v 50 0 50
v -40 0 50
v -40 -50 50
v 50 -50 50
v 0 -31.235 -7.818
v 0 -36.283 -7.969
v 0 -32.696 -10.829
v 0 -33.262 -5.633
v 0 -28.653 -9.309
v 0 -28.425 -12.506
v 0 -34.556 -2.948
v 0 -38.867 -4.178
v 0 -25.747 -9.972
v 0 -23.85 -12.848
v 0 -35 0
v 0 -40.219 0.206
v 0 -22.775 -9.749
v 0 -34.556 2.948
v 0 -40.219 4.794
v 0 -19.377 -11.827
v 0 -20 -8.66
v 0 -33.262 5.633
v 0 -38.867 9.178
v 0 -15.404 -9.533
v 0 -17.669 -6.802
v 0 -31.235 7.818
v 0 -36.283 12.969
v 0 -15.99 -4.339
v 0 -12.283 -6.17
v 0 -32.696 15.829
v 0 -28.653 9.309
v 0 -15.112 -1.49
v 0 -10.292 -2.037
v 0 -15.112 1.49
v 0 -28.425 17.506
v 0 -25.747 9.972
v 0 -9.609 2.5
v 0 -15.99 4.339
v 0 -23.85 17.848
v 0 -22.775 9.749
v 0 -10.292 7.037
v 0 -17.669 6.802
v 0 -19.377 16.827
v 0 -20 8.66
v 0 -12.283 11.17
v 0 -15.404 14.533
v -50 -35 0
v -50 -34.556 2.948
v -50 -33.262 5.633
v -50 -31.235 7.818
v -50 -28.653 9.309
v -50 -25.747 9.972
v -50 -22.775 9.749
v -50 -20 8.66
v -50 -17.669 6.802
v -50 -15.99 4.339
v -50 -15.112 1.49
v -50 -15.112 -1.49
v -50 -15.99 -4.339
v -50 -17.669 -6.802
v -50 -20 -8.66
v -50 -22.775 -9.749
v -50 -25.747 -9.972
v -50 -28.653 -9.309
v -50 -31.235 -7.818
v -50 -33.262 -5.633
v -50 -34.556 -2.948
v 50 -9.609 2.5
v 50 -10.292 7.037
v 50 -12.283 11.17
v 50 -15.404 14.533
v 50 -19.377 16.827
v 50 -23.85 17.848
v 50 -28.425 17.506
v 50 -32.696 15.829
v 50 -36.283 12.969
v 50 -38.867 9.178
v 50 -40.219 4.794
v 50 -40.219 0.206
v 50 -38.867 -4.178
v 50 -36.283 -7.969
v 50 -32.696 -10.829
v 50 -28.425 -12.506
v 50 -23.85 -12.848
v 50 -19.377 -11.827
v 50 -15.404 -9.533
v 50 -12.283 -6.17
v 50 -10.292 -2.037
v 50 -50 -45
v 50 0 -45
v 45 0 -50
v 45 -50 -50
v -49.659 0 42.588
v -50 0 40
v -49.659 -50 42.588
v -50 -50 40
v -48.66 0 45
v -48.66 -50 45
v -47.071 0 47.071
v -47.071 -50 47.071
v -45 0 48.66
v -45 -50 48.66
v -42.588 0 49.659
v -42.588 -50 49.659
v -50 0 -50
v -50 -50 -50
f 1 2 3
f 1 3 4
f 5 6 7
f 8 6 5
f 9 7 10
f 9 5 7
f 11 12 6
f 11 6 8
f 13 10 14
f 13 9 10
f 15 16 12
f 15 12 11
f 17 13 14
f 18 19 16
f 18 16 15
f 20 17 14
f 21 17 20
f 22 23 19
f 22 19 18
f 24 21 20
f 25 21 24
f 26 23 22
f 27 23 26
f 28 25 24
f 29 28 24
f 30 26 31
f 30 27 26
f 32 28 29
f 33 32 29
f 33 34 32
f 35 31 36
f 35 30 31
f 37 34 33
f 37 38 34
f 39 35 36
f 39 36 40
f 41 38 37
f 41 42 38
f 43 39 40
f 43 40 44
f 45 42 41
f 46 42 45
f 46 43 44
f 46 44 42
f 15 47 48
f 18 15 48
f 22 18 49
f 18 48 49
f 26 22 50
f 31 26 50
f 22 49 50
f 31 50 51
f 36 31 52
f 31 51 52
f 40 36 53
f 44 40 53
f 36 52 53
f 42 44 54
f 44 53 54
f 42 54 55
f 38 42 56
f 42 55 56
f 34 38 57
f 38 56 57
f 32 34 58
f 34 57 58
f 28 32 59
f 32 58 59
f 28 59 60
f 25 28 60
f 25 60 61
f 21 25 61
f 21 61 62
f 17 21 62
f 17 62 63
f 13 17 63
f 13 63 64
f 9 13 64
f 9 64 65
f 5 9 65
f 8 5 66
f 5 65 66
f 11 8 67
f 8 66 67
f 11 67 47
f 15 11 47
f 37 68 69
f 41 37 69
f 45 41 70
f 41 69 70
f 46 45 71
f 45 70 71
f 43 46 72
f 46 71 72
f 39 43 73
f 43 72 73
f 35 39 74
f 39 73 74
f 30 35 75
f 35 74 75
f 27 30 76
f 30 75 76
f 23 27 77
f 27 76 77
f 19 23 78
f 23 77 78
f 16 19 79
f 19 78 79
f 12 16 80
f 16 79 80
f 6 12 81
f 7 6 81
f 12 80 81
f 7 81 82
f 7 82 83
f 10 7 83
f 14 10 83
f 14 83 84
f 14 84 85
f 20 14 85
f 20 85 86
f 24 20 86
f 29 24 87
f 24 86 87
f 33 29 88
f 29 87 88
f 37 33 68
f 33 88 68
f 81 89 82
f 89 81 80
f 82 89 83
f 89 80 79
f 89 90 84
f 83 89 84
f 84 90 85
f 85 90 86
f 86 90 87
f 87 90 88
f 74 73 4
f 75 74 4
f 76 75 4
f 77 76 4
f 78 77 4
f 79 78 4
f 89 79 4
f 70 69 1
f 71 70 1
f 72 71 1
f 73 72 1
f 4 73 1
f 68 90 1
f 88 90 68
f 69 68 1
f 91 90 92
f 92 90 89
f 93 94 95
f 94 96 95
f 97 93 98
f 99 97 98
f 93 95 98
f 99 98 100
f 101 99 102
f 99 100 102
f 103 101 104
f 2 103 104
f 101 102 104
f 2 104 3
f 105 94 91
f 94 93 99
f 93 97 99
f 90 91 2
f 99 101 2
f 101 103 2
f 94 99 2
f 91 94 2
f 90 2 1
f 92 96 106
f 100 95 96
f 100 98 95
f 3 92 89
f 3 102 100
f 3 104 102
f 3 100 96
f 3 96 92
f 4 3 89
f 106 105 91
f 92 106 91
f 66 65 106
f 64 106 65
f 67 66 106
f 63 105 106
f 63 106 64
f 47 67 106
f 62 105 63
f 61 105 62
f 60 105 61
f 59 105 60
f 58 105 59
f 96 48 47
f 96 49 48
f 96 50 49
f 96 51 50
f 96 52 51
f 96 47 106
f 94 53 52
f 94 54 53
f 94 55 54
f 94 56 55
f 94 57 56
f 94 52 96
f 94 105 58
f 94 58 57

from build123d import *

# Parameters (mm, degrees)
F0_W     = 100
F0_H     = 100
F1_DEPTH = 50
F2_R     = 10
F3_SIZE  = 5
F4_R     = 15.391397
F5_DEPTH = 50
F6_R     = 10
F7_DEPTH = 50


with BuildPart() as f1:
    # F0 (on Front) → F1 (new body)
    with BuildSketch(Plane.XZ):
        Rectangle(F0_W, F0_H)
    extrude(amount=F1_DEPTH)

    # F2
    f2_edges = [f1.edges().sort_by_distance(p)[0] for p in [
        (-50, -25, 50),
    ]]
    fillet(f2_edges, radius=F2_R)

    # F3
    f3_edges = [f1.edges().sort_by_distance(p)[0] for p in [
        (50, -25, -50),
    ]]
    chamfer(f3_edges, length=F3_SIZE)

    # F4 (on face) → F5 (cut)
    with BuildSketch(Plane.YZ.offset(50)):
        with Locations((-25, 2.5)):
            Circle(F4_R)
    extrude(amount=-F5_DEPTH, mode=Mode.SUBTRACT)

    # F6 (on face) → F7 (cut)
    with BuildSketch(Plane(origin=(-50, 0, 0), x_dir=(0, -1, 0), z_dir=(-1, 0, 0))):
        with Locations((25, 0)):
            Circle(F6_R)
    extrude(amount=-F7_DEPTH, mode=Mode.SUBTRACT)


solid = f1.part
